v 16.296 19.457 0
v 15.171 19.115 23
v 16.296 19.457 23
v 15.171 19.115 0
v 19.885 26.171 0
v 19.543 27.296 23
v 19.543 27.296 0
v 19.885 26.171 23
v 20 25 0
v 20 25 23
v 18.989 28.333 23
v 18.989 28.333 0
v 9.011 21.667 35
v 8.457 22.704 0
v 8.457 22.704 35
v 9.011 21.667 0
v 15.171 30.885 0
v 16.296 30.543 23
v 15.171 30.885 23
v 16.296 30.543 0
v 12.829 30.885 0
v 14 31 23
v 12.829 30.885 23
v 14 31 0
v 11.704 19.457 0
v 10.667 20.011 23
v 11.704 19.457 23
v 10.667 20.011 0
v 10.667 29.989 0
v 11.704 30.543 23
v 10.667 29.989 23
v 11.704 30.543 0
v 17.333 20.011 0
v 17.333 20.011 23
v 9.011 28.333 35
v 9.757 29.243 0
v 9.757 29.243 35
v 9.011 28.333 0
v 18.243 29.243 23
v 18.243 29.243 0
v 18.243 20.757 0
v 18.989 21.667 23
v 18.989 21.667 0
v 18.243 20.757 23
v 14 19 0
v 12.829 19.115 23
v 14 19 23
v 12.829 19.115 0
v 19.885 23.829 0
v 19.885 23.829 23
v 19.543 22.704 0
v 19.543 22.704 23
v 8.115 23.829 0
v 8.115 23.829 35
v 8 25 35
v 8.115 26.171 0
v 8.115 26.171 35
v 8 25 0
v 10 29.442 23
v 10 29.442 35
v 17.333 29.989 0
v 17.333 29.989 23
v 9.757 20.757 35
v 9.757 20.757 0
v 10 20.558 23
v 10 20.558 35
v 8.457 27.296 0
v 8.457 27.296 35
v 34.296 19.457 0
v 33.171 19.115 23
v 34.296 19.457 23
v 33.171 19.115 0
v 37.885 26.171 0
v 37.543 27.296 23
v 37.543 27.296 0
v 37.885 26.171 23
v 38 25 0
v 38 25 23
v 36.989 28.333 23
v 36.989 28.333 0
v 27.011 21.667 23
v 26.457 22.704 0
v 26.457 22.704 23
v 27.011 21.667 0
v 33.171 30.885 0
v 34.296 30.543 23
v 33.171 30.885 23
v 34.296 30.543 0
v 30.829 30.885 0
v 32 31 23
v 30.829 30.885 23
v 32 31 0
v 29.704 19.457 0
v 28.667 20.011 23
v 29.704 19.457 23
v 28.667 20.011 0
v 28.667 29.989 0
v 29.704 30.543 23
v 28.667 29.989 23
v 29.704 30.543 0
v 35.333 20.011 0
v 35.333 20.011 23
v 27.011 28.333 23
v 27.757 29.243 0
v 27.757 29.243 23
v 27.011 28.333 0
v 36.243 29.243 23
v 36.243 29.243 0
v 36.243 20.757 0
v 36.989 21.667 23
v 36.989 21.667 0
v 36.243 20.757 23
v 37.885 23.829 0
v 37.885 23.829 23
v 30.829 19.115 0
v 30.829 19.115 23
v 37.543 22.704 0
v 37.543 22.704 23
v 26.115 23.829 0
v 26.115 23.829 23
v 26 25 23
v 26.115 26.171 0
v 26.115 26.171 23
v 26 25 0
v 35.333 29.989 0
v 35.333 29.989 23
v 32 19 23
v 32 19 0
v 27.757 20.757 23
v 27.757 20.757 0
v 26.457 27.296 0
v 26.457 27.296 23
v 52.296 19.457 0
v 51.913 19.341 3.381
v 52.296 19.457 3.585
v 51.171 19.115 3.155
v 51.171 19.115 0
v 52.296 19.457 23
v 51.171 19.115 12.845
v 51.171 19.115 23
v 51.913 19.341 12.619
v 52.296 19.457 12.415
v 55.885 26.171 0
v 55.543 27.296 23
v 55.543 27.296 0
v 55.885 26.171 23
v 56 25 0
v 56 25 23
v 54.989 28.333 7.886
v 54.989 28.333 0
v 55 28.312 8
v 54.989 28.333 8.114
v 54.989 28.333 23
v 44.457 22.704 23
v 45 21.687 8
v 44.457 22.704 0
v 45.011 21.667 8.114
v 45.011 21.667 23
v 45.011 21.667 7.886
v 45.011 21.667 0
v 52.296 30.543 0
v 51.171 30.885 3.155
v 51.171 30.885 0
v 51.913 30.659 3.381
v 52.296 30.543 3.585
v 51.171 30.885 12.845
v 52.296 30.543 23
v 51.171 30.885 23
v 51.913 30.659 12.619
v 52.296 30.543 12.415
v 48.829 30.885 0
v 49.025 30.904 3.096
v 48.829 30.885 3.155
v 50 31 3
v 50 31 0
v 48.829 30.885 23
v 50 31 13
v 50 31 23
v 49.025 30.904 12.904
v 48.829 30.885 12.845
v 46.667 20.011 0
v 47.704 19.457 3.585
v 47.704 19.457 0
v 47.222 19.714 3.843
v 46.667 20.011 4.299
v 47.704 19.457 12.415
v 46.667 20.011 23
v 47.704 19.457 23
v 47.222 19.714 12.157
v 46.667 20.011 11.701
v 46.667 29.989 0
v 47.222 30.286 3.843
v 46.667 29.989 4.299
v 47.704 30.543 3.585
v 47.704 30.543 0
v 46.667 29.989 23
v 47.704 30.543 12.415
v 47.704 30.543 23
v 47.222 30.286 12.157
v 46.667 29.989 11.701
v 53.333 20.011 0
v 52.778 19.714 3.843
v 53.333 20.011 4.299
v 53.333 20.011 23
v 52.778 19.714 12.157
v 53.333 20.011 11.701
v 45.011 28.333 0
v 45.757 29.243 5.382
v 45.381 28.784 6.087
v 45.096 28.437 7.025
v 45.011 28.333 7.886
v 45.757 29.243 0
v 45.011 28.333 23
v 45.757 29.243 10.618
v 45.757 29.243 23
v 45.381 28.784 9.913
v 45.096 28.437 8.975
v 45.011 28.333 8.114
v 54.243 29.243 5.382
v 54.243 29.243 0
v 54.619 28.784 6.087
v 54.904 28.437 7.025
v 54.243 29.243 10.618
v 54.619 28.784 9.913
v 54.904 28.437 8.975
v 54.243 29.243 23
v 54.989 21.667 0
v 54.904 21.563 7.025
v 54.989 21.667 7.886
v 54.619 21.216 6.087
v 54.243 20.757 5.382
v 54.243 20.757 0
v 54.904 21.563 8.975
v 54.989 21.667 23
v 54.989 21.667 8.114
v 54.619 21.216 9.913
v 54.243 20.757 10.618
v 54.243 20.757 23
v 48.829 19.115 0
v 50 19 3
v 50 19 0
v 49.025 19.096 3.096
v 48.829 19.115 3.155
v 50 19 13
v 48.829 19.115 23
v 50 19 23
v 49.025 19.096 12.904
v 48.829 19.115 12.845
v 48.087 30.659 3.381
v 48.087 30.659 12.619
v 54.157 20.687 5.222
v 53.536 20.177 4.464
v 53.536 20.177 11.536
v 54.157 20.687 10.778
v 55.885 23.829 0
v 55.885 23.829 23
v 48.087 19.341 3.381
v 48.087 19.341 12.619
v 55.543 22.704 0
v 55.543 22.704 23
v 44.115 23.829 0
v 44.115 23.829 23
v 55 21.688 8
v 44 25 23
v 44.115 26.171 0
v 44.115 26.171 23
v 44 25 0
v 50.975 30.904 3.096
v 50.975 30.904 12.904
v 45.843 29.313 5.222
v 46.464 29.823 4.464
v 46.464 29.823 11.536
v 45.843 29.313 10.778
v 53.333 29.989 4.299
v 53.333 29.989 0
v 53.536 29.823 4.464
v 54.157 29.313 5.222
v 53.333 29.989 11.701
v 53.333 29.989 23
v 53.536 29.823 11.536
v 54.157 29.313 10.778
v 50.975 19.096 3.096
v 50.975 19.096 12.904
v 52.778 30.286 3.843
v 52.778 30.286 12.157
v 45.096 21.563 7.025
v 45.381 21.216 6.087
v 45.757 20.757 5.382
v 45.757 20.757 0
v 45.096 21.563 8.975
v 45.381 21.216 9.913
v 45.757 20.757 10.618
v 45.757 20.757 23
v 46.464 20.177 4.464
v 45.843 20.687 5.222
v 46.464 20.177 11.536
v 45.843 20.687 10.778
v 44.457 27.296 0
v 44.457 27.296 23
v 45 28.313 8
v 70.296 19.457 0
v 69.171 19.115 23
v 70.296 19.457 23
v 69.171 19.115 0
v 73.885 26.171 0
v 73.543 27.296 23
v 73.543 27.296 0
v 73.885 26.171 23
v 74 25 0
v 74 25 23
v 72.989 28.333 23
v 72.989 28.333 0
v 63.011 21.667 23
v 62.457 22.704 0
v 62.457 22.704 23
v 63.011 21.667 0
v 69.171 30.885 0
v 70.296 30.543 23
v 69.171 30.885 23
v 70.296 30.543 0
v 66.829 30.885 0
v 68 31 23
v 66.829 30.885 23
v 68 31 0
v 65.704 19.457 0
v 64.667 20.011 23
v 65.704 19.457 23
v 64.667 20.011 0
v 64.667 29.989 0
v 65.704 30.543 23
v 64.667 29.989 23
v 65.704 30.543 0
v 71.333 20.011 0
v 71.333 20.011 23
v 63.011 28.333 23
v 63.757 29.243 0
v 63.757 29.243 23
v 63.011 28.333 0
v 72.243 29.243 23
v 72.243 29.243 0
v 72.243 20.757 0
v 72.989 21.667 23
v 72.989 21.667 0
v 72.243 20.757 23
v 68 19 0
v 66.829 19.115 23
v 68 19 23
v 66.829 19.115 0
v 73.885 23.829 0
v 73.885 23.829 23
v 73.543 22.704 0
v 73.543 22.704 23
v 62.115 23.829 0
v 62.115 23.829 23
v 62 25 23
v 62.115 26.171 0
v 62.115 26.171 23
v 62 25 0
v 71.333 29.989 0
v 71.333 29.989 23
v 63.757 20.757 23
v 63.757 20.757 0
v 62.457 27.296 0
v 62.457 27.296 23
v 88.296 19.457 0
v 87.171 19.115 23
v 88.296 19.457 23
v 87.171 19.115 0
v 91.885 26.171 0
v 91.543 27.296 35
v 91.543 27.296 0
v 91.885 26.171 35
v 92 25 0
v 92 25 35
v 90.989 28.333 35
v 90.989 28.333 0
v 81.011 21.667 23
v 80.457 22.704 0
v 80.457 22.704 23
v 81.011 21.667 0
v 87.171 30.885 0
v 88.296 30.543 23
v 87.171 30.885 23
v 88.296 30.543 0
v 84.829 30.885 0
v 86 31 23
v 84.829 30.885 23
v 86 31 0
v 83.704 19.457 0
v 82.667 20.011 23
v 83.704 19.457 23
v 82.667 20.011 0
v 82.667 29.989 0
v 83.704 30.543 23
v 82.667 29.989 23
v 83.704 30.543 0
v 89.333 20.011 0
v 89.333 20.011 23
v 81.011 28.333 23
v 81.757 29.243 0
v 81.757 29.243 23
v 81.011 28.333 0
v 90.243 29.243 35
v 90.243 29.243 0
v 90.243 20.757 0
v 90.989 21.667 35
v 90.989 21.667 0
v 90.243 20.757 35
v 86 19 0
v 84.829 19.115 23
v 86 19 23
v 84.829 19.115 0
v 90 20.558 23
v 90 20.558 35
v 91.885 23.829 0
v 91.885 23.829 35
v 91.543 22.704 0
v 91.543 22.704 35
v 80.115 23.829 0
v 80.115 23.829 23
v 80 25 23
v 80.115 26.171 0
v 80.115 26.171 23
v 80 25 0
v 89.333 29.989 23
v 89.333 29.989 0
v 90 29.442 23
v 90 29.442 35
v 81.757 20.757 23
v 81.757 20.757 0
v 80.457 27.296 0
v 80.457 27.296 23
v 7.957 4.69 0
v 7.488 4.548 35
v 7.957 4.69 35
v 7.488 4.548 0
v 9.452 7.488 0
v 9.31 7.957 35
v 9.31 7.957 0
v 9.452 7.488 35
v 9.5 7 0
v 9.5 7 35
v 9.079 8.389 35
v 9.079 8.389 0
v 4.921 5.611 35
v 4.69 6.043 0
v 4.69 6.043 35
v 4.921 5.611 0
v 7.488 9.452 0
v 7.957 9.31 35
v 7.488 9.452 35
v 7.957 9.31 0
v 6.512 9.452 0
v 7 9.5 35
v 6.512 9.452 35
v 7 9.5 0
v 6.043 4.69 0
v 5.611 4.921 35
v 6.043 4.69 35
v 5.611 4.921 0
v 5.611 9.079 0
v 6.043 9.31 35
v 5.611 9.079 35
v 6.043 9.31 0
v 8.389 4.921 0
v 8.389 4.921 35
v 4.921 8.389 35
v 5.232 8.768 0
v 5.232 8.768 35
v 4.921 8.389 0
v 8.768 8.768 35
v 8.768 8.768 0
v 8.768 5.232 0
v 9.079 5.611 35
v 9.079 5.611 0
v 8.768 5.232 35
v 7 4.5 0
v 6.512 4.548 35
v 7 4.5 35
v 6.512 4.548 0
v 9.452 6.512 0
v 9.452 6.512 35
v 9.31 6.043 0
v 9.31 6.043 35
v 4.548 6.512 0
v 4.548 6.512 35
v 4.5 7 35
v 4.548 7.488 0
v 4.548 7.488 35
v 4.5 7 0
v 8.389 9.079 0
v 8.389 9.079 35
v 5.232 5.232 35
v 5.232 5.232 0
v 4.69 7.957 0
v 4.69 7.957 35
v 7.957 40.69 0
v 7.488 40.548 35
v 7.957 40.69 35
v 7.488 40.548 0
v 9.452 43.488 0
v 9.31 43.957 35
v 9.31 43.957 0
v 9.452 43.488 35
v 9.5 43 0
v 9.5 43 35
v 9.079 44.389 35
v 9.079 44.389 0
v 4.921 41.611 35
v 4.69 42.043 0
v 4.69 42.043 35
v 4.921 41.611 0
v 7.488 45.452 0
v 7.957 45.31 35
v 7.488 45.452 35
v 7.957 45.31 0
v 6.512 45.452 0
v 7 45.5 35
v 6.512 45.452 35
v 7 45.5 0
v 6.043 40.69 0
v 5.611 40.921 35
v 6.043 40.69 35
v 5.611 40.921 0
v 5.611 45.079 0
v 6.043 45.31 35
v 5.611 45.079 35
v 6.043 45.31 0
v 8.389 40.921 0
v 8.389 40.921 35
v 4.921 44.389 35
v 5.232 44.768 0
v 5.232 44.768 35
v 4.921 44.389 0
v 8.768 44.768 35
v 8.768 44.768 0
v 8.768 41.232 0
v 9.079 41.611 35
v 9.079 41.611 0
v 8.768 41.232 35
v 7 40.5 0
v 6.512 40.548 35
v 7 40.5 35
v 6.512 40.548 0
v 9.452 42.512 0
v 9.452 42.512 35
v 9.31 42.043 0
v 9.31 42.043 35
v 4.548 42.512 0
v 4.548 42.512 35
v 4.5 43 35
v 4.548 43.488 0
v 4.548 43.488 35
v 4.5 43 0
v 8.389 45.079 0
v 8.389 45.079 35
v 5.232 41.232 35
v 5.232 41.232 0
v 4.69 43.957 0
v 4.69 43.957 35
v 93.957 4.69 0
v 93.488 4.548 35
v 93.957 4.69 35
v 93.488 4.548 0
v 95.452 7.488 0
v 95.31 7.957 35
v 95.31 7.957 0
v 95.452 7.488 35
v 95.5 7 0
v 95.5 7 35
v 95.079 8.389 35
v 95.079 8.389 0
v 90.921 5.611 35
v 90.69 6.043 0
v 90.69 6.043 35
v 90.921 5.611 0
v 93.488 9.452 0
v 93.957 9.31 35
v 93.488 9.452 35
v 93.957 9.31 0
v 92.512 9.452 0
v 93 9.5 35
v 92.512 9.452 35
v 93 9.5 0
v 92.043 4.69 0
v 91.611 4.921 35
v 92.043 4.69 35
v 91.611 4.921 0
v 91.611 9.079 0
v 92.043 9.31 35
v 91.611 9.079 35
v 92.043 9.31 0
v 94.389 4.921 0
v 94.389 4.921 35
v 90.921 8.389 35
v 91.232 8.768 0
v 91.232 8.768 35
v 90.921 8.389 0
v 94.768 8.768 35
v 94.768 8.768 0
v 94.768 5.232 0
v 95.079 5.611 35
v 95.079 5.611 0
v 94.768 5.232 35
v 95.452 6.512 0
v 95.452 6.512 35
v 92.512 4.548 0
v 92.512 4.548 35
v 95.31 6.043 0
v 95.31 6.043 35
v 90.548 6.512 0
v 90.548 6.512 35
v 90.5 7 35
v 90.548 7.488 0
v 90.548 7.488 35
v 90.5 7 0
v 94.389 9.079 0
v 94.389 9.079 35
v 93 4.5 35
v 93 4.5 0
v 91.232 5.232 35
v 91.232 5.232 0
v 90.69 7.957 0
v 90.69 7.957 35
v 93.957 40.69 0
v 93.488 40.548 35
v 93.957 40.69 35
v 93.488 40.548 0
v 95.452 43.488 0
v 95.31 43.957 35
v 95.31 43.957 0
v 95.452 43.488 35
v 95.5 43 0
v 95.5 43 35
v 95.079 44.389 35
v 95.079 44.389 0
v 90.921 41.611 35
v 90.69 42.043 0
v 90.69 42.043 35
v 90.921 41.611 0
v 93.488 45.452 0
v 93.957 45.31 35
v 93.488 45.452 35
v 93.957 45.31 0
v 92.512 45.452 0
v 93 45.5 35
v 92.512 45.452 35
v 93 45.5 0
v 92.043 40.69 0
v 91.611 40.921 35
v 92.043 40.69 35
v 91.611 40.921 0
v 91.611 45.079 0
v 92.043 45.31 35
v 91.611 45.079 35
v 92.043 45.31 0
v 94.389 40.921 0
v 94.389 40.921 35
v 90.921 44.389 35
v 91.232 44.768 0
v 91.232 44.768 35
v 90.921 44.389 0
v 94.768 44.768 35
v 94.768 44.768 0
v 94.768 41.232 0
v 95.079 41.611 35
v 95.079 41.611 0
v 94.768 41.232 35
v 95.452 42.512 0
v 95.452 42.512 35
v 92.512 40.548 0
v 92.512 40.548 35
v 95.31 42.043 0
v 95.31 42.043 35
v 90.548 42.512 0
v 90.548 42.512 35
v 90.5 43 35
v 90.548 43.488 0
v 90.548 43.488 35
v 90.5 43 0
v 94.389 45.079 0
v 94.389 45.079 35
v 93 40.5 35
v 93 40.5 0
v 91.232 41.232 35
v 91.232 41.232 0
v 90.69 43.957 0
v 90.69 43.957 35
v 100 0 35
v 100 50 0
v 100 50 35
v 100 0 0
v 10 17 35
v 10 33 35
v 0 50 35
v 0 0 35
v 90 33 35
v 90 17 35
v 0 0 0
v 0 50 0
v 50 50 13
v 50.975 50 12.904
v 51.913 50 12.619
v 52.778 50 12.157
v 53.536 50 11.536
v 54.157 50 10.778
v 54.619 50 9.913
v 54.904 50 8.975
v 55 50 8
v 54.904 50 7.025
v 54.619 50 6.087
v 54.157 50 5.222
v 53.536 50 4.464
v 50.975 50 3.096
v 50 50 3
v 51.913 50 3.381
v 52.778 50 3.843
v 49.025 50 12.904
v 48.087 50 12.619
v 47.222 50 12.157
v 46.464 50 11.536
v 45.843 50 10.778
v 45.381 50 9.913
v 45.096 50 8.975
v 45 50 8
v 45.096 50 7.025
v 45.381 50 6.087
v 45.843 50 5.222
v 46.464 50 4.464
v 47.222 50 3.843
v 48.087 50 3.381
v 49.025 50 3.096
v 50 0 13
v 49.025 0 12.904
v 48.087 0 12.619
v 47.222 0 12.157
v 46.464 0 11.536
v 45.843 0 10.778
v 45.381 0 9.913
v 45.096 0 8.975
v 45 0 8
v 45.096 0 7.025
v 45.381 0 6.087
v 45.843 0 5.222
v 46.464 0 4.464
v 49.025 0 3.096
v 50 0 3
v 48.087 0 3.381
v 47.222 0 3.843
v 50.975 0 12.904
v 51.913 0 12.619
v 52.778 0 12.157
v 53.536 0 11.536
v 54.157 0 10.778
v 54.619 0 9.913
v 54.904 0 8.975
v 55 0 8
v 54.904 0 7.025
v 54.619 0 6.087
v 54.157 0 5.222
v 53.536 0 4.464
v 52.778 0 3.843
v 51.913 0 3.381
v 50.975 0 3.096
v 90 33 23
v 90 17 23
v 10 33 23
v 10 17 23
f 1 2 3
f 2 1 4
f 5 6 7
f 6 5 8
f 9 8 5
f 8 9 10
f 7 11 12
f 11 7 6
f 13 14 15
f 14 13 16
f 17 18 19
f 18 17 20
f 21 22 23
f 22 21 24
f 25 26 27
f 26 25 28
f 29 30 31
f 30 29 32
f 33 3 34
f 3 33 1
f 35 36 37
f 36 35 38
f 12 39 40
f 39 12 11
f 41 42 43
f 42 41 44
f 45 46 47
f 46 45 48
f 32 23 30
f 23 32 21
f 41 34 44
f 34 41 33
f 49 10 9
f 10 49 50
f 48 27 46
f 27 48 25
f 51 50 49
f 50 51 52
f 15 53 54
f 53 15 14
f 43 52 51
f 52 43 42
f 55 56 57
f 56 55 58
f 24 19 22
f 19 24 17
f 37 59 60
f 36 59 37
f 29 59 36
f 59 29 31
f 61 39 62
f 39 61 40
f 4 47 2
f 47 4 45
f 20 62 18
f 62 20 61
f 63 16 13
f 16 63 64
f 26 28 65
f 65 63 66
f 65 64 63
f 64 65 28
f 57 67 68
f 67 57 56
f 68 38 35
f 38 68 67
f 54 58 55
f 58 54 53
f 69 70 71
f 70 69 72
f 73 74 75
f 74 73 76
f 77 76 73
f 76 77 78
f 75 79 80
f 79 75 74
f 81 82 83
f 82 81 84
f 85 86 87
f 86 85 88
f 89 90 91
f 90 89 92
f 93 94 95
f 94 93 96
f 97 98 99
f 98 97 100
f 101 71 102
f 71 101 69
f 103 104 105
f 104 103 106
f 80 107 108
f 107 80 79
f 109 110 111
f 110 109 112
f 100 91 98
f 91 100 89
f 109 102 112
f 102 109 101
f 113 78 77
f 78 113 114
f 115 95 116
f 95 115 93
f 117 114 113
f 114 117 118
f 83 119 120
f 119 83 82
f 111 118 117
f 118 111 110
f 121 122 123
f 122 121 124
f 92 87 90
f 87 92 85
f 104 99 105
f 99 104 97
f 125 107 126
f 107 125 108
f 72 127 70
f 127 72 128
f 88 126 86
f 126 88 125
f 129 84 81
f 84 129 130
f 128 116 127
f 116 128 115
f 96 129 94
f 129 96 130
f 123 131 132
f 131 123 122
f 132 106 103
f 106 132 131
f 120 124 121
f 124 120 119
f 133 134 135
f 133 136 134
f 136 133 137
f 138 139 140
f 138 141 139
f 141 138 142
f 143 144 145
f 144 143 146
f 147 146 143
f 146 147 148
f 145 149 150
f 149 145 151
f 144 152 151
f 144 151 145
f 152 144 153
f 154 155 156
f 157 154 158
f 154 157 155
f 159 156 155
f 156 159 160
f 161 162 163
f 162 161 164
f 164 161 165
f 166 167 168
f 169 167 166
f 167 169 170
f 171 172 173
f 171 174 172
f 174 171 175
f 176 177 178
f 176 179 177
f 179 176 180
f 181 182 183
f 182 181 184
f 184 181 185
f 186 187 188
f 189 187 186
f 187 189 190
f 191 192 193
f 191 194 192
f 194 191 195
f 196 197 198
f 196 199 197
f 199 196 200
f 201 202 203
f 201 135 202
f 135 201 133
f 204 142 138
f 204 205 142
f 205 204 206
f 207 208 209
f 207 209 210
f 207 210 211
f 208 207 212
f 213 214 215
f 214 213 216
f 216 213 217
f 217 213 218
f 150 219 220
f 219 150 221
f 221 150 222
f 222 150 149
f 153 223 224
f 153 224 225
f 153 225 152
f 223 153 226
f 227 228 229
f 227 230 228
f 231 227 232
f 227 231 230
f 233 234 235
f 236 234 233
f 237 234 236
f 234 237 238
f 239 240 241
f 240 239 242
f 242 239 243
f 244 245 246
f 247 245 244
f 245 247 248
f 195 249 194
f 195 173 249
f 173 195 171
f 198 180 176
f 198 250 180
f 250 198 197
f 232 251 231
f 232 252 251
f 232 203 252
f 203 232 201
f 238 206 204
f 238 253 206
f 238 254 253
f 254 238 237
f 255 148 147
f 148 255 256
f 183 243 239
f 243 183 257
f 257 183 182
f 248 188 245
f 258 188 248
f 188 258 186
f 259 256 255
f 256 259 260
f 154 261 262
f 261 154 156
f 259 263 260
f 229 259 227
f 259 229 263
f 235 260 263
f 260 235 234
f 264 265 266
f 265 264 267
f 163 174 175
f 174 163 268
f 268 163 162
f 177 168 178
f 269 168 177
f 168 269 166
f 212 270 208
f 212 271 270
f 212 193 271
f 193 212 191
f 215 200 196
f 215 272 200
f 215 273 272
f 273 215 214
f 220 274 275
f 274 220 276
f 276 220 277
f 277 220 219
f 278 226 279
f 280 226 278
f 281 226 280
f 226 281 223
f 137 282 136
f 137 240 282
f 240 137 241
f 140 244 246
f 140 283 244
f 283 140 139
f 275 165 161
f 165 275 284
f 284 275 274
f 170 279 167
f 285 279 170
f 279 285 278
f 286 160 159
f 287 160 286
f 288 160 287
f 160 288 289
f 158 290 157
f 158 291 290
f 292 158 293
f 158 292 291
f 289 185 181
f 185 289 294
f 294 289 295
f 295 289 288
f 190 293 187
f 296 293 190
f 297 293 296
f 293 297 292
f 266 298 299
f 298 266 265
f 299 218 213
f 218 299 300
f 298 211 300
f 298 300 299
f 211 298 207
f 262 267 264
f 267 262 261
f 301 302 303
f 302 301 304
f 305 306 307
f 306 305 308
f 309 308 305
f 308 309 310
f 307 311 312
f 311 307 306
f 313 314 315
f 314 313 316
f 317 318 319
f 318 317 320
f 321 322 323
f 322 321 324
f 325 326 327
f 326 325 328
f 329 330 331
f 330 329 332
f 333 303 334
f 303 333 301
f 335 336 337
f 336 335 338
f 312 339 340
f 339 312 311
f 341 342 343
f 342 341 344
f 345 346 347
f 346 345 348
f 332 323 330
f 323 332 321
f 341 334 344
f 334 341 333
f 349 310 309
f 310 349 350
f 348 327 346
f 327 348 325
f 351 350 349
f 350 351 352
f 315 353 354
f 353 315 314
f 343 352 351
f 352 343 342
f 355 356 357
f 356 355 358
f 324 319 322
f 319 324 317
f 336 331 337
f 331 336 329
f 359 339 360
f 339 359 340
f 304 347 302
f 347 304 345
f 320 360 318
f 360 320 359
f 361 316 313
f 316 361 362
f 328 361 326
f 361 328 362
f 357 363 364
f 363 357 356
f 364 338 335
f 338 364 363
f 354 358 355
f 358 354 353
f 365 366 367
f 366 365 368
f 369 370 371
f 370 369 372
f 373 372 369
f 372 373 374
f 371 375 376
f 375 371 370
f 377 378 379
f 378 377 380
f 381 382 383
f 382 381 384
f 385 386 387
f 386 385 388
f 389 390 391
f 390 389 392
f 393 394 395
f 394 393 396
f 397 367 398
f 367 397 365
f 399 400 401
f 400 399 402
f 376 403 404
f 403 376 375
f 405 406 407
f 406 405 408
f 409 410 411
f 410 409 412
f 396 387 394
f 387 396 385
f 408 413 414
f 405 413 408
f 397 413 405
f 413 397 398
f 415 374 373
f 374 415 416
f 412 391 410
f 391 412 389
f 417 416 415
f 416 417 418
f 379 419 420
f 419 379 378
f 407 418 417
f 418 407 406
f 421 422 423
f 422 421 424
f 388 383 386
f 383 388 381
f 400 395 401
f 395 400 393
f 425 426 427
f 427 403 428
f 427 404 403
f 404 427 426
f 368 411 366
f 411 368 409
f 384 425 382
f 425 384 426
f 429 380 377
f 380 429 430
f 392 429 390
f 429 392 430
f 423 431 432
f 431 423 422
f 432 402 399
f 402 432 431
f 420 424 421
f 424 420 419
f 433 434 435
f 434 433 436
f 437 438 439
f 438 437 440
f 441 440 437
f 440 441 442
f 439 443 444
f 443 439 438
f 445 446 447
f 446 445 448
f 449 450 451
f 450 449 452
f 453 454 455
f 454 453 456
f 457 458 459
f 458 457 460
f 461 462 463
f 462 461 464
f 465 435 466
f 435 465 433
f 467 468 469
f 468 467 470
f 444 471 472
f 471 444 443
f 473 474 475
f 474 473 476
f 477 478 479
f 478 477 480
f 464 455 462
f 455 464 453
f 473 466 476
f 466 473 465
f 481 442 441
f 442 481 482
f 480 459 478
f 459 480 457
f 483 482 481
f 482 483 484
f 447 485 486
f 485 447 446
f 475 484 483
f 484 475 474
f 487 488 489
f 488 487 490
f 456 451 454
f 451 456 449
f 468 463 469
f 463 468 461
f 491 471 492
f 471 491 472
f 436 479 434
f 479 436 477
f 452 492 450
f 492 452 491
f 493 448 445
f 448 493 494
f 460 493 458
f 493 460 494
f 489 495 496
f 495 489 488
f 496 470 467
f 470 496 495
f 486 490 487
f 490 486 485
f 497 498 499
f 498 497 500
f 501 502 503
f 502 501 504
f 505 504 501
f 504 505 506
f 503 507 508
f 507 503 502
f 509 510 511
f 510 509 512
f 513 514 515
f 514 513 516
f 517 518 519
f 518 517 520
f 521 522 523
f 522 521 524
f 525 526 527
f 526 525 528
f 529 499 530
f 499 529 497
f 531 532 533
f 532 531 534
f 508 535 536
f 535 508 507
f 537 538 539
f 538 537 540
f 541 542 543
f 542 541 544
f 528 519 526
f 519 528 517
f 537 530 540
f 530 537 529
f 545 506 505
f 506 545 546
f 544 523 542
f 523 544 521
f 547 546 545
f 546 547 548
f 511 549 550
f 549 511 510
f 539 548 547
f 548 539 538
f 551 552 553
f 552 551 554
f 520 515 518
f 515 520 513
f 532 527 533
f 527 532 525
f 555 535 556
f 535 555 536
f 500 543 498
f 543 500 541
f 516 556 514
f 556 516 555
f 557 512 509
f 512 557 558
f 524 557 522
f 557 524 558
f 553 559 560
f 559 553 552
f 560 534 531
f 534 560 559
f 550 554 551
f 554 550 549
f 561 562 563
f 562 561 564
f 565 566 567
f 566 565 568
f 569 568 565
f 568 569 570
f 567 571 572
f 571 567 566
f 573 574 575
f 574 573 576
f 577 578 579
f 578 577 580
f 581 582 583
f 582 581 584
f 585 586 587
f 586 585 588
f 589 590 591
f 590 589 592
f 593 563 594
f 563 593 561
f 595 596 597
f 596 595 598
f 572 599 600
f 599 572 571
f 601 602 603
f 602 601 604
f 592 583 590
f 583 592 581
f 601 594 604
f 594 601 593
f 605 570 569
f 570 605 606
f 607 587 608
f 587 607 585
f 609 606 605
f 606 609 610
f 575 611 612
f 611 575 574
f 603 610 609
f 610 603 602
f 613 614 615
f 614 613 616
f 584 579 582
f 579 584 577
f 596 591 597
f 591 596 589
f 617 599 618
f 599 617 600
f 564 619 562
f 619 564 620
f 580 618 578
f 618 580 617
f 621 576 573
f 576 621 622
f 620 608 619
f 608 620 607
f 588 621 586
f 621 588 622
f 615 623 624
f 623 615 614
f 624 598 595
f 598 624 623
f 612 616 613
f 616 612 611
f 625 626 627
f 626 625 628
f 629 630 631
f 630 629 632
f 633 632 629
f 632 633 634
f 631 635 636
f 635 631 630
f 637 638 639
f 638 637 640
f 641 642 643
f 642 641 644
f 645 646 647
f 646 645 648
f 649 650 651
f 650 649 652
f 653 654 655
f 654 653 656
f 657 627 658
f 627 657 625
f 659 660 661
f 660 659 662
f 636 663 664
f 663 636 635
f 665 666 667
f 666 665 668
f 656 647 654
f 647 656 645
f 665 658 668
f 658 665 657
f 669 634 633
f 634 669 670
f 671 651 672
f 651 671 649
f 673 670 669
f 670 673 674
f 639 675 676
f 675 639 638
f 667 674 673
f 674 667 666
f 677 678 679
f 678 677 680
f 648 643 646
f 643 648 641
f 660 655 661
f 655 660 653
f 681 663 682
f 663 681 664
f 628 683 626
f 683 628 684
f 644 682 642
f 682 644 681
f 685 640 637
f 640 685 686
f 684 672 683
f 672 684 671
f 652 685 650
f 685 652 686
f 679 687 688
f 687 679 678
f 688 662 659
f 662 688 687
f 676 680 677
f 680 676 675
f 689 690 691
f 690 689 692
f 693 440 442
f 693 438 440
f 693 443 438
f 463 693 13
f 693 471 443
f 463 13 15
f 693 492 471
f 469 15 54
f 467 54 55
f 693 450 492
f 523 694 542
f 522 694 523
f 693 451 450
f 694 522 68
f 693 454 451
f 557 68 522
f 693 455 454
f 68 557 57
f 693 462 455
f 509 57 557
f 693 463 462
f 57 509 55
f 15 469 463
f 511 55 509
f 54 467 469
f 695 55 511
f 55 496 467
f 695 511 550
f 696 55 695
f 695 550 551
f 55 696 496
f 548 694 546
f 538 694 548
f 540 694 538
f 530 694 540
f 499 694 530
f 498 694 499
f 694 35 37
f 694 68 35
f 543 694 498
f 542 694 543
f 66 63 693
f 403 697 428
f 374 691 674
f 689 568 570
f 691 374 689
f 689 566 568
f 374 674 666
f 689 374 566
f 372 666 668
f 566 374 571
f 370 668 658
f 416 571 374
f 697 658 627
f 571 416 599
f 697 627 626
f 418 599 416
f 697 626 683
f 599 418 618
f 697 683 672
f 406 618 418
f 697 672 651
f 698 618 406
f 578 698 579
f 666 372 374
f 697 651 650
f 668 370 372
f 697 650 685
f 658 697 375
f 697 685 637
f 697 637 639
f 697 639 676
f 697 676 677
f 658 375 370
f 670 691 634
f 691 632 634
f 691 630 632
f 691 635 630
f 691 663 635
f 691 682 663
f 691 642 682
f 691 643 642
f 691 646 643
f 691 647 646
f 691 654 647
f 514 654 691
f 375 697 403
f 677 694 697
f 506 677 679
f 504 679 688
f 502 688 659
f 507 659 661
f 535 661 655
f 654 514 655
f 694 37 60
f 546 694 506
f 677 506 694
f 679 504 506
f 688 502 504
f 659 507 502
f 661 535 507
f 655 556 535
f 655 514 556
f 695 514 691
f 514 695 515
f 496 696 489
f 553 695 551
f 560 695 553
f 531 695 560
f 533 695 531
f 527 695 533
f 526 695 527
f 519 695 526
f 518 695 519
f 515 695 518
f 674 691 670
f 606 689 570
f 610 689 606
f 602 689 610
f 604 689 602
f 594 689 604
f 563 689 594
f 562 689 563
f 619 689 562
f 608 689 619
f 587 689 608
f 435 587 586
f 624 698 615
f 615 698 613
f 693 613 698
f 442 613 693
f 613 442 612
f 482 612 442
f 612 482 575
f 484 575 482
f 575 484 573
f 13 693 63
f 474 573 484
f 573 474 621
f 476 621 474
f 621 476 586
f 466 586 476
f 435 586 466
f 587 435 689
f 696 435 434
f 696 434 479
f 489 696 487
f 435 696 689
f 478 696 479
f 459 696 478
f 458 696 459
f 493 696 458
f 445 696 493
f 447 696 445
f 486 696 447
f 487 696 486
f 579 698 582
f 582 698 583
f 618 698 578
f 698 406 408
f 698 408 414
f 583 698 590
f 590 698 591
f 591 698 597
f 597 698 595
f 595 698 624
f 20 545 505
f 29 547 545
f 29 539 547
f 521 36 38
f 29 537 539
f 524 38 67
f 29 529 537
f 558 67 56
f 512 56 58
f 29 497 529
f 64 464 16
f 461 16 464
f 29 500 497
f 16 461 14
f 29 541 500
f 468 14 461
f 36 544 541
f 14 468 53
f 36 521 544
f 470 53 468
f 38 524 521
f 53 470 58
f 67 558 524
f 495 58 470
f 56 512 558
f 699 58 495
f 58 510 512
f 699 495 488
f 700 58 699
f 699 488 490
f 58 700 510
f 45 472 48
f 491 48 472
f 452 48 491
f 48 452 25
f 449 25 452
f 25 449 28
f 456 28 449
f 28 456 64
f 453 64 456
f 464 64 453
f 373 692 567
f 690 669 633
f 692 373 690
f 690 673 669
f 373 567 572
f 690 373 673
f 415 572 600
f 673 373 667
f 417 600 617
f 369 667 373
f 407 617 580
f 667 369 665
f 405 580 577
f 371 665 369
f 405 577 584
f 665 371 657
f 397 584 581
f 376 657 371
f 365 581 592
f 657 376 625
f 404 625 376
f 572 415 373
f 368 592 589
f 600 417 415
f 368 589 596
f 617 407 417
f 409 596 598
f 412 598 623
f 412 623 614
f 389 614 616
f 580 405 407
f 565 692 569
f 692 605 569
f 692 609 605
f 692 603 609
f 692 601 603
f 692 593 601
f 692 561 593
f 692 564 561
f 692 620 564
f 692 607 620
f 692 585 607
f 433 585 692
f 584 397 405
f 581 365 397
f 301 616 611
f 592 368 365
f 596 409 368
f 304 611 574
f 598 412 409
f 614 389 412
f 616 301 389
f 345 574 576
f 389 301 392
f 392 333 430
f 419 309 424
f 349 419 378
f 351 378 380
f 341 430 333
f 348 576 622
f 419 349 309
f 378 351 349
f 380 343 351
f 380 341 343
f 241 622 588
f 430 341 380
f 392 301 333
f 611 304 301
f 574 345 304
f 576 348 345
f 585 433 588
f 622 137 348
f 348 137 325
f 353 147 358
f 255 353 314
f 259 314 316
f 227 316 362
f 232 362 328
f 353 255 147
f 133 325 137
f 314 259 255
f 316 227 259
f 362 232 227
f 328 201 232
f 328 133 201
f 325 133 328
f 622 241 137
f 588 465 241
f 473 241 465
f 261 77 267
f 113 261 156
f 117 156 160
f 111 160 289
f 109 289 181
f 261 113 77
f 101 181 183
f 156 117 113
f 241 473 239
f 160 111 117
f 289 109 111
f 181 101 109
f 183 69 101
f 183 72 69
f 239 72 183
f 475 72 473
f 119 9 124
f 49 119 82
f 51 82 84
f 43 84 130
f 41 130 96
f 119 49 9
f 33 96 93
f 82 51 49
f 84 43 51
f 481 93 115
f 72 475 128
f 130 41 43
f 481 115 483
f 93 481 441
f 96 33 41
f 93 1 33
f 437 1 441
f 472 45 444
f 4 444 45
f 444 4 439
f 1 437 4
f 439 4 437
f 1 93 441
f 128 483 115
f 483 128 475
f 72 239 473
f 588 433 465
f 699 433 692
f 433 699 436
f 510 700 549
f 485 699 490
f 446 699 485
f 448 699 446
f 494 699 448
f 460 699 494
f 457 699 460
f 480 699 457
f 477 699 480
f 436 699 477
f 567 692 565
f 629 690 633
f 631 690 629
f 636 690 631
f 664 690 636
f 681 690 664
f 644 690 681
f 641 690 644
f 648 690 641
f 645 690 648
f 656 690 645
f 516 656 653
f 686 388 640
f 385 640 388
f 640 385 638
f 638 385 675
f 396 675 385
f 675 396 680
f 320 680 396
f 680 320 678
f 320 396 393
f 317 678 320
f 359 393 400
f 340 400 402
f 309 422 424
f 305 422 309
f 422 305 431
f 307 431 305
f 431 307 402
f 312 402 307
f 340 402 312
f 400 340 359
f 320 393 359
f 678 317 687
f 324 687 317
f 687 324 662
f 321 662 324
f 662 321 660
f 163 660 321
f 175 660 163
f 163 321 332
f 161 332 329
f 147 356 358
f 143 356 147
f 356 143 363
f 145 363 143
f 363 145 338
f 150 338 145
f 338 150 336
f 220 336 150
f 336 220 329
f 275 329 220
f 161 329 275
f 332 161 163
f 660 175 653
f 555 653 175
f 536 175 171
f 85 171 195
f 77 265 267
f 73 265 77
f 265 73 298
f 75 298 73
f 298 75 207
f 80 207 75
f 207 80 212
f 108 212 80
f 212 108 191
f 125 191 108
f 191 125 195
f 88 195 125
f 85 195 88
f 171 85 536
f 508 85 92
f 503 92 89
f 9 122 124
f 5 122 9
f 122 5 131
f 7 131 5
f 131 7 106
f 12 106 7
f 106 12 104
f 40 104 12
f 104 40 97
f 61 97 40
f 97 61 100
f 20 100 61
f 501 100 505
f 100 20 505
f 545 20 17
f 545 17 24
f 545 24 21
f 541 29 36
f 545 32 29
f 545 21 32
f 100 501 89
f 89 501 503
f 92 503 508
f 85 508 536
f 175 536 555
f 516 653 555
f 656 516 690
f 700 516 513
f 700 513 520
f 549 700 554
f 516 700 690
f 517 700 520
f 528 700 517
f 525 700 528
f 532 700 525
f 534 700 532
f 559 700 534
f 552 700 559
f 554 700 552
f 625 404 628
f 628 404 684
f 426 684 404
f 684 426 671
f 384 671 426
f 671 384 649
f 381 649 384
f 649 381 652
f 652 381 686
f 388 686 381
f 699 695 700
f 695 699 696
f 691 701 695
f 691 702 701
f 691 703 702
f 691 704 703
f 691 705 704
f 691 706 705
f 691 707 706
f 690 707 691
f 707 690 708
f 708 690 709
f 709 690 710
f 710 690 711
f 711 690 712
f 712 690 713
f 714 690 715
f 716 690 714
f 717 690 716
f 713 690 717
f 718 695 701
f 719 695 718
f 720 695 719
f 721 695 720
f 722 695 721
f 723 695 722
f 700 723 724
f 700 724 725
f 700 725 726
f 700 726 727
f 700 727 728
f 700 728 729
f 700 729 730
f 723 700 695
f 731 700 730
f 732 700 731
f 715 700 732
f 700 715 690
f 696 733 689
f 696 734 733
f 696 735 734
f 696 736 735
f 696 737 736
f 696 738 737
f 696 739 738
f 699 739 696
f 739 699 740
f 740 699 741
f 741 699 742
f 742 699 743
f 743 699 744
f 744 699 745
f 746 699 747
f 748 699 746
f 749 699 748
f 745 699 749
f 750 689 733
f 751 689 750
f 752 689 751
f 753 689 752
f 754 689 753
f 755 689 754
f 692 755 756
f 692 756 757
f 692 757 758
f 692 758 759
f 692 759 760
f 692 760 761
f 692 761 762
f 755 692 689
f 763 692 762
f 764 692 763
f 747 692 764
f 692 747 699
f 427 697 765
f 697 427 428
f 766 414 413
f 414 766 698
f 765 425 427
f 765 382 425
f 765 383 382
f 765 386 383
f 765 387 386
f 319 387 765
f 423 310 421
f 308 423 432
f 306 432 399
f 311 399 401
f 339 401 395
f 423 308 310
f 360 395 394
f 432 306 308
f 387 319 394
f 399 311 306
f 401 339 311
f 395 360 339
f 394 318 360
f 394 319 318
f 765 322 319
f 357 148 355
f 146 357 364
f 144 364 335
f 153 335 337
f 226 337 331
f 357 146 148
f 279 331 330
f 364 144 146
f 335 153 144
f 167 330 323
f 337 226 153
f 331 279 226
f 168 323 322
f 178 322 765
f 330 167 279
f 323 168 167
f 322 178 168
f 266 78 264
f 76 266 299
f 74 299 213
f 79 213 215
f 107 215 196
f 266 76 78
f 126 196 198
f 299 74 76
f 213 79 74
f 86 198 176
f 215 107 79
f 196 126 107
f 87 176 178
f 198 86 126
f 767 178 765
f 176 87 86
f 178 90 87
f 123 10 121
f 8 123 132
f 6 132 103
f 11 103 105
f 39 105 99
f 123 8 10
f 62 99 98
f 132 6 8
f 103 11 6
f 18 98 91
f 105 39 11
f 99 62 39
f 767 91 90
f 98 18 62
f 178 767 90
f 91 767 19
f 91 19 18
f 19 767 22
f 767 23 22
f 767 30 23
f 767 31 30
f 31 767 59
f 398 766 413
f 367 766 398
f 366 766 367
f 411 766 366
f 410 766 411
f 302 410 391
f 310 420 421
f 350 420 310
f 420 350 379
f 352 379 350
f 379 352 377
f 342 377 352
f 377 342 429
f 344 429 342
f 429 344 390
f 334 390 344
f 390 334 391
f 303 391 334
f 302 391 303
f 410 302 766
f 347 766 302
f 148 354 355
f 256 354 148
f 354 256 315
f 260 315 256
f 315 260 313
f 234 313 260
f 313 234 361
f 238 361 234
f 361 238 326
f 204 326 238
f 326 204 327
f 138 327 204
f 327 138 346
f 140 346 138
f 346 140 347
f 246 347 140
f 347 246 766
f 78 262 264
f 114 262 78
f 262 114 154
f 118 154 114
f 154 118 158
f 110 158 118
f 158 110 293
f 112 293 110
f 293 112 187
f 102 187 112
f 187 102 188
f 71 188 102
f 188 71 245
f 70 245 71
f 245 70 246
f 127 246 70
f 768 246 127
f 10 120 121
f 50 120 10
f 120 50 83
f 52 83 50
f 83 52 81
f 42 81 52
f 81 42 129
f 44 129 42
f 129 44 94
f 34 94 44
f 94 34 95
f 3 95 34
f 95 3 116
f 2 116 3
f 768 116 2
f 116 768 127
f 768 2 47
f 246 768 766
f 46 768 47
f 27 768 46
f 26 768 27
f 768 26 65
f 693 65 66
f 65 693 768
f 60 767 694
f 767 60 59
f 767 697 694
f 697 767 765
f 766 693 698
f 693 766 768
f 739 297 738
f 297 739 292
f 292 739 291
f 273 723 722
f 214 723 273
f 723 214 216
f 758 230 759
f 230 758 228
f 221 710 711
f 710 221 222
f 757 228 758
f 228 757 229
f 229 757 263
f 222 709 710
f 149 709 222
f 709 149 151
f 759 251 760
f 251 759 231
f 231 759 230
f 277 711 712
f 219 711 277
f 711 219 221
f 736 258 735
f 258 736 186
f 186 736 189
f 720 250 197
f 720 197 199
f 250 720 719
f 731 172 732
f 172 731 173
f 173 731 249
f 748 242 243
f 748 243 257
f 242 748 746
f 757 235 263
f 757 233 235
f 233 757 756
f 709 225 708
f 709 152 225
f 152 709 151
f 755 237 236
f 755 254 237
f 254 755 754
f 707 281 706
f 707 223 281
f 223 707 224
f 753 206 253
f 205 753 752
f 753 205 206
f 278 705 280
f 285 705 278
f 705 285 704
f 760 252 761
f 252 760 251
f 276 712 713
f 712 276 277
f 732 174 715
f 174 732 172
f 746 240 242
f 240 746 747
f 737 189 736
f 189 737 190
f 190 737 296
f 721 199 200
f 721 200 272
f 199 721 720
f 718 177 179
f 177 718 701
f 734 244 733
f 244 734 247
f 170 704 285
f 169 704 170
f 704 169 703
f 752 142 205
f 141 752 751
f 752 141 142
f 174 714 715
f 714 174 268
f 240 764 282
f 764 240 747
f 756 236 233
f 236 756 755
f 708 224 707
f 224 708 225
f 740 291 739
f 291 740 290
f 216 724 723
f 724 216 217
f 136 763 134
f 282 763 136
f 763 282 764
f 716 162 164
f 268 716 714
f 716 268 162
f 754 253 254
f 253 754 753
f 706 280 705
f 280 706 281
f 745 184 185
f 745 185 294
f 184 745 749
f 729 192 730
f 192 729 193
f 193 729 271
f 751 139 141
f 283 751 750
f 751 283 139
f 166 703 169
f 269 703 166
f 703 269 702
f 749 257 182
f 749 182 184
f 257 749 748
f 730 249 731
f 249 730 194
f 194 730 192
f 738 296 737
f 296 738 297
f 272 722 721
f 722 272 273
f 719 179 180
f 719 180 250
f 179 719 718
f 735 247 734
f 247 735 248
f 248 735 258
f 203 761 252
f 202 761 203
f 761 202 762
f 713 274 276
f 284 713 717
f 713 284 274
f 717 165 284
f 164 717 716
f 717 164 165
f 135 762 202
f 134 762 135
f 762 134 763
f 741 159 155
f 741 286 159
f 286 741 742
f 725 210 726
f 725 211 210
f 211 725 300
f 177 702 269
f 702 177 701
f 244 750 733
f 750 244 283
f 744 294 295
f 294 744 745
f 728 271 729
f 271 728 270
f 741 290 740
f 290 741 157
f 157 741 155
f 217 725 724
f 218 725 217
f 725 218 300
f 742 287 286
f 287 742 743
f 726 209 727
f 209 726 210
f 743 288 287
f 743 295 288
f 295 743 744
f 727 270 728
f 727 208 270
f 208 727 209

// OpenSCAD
$fn = 32;

// ----------------------------------------------------------------------
// Manifold block: side_outlet manifold
// ----------------------------------------------------------------------

// --- parameters (mm) ---
block_l = 100;            // block length, X
block_w = 50;             // block width, Y
block_h = 35;             // block height, Z
port_d = 12;              // port bore diameter
port_pitch = 18;          // port pitch along X
gallery_d = 16;           // top gallery width, Y
gallery_depth = 12;       // gallery pocket depth
wall_p = 10;              // gallery end wall thickness, X
mnt_d = 5;                // mounting hole diameter
mnt_in = 7;               // mounting hole inset from the edges
out_d = 10;               // outlet bore diameter
out_z = 8;                // outlet axis height

n_ports = 5;  // ports in the row
port_x0 = (block_l - (n_ports - 1) * port_pitch) / 2;  // first port X

difference() {
  cube([block_l, block_w, block_h]);
  for (i = [0 : n_ports - 1])
    translate([port_x0 + i * port_pitch, block_w / 2, -1])
      cylinder(h = block_h + 2, d = port_d);
  translate([wall_p, block_w / 2 - gallery_d / 2, block_h - gallery_depth])
    cube([block_l - 2 * wall_p, gallery_d, gallery_depth + 1]);
  for (cx = [mnt_in, block_l - mnt_in])
    for (cy = [mnt_in, block_w - mnt_in])
      translate([cx, cy, -1]) cylinder(h = block_h + 2, d = mnt_d);
  translate([block_l / 2, -1, out_z]) rotate([-90, 0, 0])
    cylinder(h = block_w + 2, d = out_d);
}
